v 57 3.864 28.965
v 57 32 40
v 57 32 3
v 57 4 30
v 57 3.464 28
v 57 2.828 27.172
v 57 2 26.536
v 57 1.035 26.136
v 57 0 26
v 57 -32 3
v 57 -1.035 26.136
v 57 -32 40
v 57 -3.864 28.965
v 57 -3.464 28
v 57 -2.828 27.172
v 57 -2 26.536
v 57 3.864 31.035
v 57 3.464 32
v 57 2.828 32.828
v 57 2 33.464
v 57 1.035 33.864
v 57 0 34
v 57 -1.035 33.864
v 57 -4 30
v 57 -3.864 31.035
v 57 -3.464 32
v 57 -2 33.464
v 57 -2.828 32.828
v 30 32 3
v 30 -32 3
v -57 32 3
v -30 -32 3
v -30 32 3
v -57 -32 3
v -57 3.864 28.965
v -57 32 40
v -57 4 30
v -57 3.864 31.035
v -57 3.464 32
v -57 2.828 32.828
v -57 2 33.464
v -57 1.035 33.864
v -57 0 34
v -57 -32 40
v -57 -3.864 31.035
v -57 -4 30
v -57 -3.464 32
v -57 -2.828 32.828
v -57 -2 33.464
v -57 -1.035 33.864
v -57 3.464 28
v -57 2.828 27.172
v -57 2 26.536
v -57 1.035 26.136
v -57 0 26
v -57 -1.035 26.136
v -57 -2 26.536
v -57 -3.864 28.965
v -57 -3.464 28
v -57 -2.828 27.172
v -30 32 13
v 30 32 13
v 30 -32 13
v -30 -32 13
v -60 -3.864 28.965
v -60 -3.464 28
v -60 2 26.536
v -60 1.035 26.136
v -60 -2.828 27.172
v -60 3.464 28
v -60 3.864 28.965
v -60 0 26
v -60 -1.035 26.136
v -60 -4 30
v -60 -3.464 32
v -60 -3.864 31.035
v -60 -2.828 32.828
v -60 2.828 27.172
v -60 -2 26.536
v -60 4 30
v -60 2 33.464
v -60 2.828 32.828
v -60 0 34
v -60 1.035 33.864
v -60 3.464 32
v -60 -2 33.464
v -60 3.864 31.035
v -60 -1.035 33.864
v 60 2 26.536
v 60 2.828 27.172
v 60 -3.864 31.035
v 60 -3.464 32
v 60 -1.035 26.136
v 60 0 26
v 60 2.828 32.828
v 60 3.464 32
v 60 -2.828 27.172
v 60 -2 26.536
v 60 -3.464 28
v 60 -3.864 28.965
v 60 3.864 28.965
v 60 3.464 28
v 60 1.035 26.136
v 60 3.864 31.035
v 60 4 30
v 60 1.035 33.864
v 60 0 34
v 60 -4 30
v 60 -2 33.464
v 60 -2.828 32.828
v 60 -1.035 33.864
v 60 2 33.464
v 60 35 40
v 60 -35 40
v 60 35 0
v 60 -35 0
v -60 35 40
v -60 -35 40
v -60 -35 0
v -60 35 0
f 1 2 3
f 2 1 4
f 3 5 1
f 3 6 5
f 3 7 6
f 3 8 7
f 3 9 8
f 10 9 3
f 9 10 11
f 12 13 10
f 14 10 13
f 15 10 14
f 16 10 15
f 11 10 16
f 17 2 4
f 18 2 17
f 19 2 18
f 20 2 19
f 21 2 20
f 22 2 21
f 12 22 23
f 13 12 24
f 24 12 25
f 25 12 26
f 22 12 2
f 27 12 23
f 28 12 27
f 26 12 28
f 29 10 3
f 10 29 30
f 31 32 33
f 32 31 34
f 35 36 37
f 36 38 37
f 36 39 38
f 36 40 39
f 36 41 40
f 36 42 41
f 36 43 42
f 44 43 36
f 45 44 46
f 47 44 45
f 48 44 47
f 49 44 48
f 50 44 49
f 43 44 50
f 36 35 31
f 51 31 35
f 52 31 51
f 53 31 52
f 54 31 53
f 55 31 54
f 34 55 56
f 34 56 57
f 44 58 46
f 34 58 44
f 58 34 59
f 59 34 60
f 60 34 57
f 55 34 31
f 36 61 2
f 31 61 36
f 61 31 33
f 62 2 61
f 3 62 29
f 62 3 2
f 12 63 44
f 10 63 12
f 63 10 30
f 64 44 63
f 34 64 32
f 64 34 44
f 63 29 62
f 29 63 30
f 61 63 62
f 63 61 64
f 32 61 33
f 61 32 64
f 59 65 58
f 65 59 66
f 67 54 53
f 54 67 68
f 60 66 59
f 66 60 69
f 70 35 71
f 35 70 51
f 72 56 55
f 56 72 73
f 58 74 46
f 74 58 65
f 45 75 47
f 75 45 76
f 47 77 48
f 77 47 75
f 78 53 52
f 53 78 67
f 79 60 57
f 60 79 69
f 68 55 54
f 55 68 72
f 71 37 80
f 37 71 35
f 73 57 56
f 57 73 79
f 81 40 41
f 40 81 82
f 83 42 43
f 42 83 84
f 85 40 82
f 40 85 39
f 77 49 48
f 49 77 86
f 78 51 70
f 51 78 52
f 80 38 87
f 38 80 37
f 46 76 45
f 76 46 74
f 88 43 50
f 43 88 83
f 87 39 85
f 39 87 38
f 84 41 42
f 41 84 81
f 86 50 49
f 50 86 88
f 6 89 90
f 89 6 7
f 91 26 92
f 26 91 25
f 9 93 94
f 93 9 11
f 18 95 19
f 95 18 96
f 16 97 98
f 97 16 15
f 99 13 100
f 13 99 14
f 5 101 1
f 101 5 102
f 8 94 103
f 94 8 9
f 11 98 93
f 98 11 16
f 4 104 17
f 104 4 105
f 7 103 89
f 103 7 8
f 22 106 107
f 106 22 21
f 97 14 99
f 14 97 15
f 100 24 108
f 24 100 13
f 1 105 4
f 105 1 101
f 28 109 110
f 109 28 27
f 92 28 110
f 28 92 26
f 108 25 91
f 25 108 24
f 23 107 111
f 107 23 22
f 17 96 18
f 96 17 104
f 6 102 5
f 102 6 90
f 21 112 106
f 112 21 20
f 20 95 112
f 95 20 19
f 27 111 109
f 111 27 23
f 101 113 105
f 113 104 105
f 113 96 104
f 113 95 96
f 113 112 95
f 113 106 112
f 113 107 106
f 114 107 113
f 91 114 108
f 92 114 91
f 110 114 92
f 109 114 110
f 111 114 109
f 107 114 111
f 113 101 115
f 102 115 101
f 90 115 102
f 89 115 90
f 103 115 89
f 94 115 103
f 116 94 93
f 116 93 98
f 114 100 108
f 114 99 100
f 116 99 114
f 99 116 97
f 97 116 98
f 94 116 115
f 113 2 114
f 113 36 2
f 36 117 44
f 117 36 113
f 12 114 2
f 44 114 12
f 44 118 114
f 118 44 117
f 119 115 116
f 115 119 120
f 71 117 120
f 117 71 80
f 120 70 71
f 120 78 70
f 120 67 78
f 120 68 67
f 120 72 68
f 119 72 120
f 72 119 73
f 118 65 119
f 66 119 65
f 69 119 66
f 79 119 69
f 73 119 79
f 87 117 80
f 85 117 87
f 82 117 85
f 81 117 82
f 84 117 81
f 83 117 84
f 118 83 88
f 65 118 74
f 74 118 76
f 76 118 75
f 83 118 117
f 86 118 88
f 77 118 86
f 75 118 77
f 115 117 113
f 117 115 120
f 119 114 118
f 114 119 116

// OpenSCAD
// Buffer tank for a mini horizontal gel-electrophoresis box
// Category: full hardware. Raised gel platform between two buffer chambers and
// 2 mm holes for platinum/stainless electrode wires.
// Print: PETG, 0.2 mm layers, 4+ perimeters; leak-test with water before use.
// SAFETY: electrophoresis runs at ~50-150 V DC - a closed lid with an interlock and
// a proper power supply are required. Never run it open.
// SPDX-License-Identifier: CERN-OHL-P-2.0

/* [Tank] */
outer = [120, 70, 40]; // X, Y, Z
wall = 3;
floor_t = 3;
platform_len = 60;     // along X, centred
platform_h = 10;       // above the inner floor
wire_d = 8;
wire_z = 30;

/* [Hidden] */
eps = 0.01;

difference() {
    translate([-outer.x / 2, -outer.y / 2, 0]) cube(outer);
    difference() {
        translate([-outer.x / 2 + wall, -outer.y / 2 + wall, floor_t])
            cube([outer.x - 2 * wall, outer.y - 2 * wall, outer.z]);
        translate([-platform_len / 2, -outer.y / 2, 0])
            cube([platform_len, outer.y, floor_t + platform_h]);
    }
    for (sx = [-1, 1])
        translate([sx * (outer.x / 2 - wall / 2), 0, wire_z])
            rotate([0, 90, 0]) cylinder(d = wire_d, h = wall + 2, center = true, $fn = 24);
}
